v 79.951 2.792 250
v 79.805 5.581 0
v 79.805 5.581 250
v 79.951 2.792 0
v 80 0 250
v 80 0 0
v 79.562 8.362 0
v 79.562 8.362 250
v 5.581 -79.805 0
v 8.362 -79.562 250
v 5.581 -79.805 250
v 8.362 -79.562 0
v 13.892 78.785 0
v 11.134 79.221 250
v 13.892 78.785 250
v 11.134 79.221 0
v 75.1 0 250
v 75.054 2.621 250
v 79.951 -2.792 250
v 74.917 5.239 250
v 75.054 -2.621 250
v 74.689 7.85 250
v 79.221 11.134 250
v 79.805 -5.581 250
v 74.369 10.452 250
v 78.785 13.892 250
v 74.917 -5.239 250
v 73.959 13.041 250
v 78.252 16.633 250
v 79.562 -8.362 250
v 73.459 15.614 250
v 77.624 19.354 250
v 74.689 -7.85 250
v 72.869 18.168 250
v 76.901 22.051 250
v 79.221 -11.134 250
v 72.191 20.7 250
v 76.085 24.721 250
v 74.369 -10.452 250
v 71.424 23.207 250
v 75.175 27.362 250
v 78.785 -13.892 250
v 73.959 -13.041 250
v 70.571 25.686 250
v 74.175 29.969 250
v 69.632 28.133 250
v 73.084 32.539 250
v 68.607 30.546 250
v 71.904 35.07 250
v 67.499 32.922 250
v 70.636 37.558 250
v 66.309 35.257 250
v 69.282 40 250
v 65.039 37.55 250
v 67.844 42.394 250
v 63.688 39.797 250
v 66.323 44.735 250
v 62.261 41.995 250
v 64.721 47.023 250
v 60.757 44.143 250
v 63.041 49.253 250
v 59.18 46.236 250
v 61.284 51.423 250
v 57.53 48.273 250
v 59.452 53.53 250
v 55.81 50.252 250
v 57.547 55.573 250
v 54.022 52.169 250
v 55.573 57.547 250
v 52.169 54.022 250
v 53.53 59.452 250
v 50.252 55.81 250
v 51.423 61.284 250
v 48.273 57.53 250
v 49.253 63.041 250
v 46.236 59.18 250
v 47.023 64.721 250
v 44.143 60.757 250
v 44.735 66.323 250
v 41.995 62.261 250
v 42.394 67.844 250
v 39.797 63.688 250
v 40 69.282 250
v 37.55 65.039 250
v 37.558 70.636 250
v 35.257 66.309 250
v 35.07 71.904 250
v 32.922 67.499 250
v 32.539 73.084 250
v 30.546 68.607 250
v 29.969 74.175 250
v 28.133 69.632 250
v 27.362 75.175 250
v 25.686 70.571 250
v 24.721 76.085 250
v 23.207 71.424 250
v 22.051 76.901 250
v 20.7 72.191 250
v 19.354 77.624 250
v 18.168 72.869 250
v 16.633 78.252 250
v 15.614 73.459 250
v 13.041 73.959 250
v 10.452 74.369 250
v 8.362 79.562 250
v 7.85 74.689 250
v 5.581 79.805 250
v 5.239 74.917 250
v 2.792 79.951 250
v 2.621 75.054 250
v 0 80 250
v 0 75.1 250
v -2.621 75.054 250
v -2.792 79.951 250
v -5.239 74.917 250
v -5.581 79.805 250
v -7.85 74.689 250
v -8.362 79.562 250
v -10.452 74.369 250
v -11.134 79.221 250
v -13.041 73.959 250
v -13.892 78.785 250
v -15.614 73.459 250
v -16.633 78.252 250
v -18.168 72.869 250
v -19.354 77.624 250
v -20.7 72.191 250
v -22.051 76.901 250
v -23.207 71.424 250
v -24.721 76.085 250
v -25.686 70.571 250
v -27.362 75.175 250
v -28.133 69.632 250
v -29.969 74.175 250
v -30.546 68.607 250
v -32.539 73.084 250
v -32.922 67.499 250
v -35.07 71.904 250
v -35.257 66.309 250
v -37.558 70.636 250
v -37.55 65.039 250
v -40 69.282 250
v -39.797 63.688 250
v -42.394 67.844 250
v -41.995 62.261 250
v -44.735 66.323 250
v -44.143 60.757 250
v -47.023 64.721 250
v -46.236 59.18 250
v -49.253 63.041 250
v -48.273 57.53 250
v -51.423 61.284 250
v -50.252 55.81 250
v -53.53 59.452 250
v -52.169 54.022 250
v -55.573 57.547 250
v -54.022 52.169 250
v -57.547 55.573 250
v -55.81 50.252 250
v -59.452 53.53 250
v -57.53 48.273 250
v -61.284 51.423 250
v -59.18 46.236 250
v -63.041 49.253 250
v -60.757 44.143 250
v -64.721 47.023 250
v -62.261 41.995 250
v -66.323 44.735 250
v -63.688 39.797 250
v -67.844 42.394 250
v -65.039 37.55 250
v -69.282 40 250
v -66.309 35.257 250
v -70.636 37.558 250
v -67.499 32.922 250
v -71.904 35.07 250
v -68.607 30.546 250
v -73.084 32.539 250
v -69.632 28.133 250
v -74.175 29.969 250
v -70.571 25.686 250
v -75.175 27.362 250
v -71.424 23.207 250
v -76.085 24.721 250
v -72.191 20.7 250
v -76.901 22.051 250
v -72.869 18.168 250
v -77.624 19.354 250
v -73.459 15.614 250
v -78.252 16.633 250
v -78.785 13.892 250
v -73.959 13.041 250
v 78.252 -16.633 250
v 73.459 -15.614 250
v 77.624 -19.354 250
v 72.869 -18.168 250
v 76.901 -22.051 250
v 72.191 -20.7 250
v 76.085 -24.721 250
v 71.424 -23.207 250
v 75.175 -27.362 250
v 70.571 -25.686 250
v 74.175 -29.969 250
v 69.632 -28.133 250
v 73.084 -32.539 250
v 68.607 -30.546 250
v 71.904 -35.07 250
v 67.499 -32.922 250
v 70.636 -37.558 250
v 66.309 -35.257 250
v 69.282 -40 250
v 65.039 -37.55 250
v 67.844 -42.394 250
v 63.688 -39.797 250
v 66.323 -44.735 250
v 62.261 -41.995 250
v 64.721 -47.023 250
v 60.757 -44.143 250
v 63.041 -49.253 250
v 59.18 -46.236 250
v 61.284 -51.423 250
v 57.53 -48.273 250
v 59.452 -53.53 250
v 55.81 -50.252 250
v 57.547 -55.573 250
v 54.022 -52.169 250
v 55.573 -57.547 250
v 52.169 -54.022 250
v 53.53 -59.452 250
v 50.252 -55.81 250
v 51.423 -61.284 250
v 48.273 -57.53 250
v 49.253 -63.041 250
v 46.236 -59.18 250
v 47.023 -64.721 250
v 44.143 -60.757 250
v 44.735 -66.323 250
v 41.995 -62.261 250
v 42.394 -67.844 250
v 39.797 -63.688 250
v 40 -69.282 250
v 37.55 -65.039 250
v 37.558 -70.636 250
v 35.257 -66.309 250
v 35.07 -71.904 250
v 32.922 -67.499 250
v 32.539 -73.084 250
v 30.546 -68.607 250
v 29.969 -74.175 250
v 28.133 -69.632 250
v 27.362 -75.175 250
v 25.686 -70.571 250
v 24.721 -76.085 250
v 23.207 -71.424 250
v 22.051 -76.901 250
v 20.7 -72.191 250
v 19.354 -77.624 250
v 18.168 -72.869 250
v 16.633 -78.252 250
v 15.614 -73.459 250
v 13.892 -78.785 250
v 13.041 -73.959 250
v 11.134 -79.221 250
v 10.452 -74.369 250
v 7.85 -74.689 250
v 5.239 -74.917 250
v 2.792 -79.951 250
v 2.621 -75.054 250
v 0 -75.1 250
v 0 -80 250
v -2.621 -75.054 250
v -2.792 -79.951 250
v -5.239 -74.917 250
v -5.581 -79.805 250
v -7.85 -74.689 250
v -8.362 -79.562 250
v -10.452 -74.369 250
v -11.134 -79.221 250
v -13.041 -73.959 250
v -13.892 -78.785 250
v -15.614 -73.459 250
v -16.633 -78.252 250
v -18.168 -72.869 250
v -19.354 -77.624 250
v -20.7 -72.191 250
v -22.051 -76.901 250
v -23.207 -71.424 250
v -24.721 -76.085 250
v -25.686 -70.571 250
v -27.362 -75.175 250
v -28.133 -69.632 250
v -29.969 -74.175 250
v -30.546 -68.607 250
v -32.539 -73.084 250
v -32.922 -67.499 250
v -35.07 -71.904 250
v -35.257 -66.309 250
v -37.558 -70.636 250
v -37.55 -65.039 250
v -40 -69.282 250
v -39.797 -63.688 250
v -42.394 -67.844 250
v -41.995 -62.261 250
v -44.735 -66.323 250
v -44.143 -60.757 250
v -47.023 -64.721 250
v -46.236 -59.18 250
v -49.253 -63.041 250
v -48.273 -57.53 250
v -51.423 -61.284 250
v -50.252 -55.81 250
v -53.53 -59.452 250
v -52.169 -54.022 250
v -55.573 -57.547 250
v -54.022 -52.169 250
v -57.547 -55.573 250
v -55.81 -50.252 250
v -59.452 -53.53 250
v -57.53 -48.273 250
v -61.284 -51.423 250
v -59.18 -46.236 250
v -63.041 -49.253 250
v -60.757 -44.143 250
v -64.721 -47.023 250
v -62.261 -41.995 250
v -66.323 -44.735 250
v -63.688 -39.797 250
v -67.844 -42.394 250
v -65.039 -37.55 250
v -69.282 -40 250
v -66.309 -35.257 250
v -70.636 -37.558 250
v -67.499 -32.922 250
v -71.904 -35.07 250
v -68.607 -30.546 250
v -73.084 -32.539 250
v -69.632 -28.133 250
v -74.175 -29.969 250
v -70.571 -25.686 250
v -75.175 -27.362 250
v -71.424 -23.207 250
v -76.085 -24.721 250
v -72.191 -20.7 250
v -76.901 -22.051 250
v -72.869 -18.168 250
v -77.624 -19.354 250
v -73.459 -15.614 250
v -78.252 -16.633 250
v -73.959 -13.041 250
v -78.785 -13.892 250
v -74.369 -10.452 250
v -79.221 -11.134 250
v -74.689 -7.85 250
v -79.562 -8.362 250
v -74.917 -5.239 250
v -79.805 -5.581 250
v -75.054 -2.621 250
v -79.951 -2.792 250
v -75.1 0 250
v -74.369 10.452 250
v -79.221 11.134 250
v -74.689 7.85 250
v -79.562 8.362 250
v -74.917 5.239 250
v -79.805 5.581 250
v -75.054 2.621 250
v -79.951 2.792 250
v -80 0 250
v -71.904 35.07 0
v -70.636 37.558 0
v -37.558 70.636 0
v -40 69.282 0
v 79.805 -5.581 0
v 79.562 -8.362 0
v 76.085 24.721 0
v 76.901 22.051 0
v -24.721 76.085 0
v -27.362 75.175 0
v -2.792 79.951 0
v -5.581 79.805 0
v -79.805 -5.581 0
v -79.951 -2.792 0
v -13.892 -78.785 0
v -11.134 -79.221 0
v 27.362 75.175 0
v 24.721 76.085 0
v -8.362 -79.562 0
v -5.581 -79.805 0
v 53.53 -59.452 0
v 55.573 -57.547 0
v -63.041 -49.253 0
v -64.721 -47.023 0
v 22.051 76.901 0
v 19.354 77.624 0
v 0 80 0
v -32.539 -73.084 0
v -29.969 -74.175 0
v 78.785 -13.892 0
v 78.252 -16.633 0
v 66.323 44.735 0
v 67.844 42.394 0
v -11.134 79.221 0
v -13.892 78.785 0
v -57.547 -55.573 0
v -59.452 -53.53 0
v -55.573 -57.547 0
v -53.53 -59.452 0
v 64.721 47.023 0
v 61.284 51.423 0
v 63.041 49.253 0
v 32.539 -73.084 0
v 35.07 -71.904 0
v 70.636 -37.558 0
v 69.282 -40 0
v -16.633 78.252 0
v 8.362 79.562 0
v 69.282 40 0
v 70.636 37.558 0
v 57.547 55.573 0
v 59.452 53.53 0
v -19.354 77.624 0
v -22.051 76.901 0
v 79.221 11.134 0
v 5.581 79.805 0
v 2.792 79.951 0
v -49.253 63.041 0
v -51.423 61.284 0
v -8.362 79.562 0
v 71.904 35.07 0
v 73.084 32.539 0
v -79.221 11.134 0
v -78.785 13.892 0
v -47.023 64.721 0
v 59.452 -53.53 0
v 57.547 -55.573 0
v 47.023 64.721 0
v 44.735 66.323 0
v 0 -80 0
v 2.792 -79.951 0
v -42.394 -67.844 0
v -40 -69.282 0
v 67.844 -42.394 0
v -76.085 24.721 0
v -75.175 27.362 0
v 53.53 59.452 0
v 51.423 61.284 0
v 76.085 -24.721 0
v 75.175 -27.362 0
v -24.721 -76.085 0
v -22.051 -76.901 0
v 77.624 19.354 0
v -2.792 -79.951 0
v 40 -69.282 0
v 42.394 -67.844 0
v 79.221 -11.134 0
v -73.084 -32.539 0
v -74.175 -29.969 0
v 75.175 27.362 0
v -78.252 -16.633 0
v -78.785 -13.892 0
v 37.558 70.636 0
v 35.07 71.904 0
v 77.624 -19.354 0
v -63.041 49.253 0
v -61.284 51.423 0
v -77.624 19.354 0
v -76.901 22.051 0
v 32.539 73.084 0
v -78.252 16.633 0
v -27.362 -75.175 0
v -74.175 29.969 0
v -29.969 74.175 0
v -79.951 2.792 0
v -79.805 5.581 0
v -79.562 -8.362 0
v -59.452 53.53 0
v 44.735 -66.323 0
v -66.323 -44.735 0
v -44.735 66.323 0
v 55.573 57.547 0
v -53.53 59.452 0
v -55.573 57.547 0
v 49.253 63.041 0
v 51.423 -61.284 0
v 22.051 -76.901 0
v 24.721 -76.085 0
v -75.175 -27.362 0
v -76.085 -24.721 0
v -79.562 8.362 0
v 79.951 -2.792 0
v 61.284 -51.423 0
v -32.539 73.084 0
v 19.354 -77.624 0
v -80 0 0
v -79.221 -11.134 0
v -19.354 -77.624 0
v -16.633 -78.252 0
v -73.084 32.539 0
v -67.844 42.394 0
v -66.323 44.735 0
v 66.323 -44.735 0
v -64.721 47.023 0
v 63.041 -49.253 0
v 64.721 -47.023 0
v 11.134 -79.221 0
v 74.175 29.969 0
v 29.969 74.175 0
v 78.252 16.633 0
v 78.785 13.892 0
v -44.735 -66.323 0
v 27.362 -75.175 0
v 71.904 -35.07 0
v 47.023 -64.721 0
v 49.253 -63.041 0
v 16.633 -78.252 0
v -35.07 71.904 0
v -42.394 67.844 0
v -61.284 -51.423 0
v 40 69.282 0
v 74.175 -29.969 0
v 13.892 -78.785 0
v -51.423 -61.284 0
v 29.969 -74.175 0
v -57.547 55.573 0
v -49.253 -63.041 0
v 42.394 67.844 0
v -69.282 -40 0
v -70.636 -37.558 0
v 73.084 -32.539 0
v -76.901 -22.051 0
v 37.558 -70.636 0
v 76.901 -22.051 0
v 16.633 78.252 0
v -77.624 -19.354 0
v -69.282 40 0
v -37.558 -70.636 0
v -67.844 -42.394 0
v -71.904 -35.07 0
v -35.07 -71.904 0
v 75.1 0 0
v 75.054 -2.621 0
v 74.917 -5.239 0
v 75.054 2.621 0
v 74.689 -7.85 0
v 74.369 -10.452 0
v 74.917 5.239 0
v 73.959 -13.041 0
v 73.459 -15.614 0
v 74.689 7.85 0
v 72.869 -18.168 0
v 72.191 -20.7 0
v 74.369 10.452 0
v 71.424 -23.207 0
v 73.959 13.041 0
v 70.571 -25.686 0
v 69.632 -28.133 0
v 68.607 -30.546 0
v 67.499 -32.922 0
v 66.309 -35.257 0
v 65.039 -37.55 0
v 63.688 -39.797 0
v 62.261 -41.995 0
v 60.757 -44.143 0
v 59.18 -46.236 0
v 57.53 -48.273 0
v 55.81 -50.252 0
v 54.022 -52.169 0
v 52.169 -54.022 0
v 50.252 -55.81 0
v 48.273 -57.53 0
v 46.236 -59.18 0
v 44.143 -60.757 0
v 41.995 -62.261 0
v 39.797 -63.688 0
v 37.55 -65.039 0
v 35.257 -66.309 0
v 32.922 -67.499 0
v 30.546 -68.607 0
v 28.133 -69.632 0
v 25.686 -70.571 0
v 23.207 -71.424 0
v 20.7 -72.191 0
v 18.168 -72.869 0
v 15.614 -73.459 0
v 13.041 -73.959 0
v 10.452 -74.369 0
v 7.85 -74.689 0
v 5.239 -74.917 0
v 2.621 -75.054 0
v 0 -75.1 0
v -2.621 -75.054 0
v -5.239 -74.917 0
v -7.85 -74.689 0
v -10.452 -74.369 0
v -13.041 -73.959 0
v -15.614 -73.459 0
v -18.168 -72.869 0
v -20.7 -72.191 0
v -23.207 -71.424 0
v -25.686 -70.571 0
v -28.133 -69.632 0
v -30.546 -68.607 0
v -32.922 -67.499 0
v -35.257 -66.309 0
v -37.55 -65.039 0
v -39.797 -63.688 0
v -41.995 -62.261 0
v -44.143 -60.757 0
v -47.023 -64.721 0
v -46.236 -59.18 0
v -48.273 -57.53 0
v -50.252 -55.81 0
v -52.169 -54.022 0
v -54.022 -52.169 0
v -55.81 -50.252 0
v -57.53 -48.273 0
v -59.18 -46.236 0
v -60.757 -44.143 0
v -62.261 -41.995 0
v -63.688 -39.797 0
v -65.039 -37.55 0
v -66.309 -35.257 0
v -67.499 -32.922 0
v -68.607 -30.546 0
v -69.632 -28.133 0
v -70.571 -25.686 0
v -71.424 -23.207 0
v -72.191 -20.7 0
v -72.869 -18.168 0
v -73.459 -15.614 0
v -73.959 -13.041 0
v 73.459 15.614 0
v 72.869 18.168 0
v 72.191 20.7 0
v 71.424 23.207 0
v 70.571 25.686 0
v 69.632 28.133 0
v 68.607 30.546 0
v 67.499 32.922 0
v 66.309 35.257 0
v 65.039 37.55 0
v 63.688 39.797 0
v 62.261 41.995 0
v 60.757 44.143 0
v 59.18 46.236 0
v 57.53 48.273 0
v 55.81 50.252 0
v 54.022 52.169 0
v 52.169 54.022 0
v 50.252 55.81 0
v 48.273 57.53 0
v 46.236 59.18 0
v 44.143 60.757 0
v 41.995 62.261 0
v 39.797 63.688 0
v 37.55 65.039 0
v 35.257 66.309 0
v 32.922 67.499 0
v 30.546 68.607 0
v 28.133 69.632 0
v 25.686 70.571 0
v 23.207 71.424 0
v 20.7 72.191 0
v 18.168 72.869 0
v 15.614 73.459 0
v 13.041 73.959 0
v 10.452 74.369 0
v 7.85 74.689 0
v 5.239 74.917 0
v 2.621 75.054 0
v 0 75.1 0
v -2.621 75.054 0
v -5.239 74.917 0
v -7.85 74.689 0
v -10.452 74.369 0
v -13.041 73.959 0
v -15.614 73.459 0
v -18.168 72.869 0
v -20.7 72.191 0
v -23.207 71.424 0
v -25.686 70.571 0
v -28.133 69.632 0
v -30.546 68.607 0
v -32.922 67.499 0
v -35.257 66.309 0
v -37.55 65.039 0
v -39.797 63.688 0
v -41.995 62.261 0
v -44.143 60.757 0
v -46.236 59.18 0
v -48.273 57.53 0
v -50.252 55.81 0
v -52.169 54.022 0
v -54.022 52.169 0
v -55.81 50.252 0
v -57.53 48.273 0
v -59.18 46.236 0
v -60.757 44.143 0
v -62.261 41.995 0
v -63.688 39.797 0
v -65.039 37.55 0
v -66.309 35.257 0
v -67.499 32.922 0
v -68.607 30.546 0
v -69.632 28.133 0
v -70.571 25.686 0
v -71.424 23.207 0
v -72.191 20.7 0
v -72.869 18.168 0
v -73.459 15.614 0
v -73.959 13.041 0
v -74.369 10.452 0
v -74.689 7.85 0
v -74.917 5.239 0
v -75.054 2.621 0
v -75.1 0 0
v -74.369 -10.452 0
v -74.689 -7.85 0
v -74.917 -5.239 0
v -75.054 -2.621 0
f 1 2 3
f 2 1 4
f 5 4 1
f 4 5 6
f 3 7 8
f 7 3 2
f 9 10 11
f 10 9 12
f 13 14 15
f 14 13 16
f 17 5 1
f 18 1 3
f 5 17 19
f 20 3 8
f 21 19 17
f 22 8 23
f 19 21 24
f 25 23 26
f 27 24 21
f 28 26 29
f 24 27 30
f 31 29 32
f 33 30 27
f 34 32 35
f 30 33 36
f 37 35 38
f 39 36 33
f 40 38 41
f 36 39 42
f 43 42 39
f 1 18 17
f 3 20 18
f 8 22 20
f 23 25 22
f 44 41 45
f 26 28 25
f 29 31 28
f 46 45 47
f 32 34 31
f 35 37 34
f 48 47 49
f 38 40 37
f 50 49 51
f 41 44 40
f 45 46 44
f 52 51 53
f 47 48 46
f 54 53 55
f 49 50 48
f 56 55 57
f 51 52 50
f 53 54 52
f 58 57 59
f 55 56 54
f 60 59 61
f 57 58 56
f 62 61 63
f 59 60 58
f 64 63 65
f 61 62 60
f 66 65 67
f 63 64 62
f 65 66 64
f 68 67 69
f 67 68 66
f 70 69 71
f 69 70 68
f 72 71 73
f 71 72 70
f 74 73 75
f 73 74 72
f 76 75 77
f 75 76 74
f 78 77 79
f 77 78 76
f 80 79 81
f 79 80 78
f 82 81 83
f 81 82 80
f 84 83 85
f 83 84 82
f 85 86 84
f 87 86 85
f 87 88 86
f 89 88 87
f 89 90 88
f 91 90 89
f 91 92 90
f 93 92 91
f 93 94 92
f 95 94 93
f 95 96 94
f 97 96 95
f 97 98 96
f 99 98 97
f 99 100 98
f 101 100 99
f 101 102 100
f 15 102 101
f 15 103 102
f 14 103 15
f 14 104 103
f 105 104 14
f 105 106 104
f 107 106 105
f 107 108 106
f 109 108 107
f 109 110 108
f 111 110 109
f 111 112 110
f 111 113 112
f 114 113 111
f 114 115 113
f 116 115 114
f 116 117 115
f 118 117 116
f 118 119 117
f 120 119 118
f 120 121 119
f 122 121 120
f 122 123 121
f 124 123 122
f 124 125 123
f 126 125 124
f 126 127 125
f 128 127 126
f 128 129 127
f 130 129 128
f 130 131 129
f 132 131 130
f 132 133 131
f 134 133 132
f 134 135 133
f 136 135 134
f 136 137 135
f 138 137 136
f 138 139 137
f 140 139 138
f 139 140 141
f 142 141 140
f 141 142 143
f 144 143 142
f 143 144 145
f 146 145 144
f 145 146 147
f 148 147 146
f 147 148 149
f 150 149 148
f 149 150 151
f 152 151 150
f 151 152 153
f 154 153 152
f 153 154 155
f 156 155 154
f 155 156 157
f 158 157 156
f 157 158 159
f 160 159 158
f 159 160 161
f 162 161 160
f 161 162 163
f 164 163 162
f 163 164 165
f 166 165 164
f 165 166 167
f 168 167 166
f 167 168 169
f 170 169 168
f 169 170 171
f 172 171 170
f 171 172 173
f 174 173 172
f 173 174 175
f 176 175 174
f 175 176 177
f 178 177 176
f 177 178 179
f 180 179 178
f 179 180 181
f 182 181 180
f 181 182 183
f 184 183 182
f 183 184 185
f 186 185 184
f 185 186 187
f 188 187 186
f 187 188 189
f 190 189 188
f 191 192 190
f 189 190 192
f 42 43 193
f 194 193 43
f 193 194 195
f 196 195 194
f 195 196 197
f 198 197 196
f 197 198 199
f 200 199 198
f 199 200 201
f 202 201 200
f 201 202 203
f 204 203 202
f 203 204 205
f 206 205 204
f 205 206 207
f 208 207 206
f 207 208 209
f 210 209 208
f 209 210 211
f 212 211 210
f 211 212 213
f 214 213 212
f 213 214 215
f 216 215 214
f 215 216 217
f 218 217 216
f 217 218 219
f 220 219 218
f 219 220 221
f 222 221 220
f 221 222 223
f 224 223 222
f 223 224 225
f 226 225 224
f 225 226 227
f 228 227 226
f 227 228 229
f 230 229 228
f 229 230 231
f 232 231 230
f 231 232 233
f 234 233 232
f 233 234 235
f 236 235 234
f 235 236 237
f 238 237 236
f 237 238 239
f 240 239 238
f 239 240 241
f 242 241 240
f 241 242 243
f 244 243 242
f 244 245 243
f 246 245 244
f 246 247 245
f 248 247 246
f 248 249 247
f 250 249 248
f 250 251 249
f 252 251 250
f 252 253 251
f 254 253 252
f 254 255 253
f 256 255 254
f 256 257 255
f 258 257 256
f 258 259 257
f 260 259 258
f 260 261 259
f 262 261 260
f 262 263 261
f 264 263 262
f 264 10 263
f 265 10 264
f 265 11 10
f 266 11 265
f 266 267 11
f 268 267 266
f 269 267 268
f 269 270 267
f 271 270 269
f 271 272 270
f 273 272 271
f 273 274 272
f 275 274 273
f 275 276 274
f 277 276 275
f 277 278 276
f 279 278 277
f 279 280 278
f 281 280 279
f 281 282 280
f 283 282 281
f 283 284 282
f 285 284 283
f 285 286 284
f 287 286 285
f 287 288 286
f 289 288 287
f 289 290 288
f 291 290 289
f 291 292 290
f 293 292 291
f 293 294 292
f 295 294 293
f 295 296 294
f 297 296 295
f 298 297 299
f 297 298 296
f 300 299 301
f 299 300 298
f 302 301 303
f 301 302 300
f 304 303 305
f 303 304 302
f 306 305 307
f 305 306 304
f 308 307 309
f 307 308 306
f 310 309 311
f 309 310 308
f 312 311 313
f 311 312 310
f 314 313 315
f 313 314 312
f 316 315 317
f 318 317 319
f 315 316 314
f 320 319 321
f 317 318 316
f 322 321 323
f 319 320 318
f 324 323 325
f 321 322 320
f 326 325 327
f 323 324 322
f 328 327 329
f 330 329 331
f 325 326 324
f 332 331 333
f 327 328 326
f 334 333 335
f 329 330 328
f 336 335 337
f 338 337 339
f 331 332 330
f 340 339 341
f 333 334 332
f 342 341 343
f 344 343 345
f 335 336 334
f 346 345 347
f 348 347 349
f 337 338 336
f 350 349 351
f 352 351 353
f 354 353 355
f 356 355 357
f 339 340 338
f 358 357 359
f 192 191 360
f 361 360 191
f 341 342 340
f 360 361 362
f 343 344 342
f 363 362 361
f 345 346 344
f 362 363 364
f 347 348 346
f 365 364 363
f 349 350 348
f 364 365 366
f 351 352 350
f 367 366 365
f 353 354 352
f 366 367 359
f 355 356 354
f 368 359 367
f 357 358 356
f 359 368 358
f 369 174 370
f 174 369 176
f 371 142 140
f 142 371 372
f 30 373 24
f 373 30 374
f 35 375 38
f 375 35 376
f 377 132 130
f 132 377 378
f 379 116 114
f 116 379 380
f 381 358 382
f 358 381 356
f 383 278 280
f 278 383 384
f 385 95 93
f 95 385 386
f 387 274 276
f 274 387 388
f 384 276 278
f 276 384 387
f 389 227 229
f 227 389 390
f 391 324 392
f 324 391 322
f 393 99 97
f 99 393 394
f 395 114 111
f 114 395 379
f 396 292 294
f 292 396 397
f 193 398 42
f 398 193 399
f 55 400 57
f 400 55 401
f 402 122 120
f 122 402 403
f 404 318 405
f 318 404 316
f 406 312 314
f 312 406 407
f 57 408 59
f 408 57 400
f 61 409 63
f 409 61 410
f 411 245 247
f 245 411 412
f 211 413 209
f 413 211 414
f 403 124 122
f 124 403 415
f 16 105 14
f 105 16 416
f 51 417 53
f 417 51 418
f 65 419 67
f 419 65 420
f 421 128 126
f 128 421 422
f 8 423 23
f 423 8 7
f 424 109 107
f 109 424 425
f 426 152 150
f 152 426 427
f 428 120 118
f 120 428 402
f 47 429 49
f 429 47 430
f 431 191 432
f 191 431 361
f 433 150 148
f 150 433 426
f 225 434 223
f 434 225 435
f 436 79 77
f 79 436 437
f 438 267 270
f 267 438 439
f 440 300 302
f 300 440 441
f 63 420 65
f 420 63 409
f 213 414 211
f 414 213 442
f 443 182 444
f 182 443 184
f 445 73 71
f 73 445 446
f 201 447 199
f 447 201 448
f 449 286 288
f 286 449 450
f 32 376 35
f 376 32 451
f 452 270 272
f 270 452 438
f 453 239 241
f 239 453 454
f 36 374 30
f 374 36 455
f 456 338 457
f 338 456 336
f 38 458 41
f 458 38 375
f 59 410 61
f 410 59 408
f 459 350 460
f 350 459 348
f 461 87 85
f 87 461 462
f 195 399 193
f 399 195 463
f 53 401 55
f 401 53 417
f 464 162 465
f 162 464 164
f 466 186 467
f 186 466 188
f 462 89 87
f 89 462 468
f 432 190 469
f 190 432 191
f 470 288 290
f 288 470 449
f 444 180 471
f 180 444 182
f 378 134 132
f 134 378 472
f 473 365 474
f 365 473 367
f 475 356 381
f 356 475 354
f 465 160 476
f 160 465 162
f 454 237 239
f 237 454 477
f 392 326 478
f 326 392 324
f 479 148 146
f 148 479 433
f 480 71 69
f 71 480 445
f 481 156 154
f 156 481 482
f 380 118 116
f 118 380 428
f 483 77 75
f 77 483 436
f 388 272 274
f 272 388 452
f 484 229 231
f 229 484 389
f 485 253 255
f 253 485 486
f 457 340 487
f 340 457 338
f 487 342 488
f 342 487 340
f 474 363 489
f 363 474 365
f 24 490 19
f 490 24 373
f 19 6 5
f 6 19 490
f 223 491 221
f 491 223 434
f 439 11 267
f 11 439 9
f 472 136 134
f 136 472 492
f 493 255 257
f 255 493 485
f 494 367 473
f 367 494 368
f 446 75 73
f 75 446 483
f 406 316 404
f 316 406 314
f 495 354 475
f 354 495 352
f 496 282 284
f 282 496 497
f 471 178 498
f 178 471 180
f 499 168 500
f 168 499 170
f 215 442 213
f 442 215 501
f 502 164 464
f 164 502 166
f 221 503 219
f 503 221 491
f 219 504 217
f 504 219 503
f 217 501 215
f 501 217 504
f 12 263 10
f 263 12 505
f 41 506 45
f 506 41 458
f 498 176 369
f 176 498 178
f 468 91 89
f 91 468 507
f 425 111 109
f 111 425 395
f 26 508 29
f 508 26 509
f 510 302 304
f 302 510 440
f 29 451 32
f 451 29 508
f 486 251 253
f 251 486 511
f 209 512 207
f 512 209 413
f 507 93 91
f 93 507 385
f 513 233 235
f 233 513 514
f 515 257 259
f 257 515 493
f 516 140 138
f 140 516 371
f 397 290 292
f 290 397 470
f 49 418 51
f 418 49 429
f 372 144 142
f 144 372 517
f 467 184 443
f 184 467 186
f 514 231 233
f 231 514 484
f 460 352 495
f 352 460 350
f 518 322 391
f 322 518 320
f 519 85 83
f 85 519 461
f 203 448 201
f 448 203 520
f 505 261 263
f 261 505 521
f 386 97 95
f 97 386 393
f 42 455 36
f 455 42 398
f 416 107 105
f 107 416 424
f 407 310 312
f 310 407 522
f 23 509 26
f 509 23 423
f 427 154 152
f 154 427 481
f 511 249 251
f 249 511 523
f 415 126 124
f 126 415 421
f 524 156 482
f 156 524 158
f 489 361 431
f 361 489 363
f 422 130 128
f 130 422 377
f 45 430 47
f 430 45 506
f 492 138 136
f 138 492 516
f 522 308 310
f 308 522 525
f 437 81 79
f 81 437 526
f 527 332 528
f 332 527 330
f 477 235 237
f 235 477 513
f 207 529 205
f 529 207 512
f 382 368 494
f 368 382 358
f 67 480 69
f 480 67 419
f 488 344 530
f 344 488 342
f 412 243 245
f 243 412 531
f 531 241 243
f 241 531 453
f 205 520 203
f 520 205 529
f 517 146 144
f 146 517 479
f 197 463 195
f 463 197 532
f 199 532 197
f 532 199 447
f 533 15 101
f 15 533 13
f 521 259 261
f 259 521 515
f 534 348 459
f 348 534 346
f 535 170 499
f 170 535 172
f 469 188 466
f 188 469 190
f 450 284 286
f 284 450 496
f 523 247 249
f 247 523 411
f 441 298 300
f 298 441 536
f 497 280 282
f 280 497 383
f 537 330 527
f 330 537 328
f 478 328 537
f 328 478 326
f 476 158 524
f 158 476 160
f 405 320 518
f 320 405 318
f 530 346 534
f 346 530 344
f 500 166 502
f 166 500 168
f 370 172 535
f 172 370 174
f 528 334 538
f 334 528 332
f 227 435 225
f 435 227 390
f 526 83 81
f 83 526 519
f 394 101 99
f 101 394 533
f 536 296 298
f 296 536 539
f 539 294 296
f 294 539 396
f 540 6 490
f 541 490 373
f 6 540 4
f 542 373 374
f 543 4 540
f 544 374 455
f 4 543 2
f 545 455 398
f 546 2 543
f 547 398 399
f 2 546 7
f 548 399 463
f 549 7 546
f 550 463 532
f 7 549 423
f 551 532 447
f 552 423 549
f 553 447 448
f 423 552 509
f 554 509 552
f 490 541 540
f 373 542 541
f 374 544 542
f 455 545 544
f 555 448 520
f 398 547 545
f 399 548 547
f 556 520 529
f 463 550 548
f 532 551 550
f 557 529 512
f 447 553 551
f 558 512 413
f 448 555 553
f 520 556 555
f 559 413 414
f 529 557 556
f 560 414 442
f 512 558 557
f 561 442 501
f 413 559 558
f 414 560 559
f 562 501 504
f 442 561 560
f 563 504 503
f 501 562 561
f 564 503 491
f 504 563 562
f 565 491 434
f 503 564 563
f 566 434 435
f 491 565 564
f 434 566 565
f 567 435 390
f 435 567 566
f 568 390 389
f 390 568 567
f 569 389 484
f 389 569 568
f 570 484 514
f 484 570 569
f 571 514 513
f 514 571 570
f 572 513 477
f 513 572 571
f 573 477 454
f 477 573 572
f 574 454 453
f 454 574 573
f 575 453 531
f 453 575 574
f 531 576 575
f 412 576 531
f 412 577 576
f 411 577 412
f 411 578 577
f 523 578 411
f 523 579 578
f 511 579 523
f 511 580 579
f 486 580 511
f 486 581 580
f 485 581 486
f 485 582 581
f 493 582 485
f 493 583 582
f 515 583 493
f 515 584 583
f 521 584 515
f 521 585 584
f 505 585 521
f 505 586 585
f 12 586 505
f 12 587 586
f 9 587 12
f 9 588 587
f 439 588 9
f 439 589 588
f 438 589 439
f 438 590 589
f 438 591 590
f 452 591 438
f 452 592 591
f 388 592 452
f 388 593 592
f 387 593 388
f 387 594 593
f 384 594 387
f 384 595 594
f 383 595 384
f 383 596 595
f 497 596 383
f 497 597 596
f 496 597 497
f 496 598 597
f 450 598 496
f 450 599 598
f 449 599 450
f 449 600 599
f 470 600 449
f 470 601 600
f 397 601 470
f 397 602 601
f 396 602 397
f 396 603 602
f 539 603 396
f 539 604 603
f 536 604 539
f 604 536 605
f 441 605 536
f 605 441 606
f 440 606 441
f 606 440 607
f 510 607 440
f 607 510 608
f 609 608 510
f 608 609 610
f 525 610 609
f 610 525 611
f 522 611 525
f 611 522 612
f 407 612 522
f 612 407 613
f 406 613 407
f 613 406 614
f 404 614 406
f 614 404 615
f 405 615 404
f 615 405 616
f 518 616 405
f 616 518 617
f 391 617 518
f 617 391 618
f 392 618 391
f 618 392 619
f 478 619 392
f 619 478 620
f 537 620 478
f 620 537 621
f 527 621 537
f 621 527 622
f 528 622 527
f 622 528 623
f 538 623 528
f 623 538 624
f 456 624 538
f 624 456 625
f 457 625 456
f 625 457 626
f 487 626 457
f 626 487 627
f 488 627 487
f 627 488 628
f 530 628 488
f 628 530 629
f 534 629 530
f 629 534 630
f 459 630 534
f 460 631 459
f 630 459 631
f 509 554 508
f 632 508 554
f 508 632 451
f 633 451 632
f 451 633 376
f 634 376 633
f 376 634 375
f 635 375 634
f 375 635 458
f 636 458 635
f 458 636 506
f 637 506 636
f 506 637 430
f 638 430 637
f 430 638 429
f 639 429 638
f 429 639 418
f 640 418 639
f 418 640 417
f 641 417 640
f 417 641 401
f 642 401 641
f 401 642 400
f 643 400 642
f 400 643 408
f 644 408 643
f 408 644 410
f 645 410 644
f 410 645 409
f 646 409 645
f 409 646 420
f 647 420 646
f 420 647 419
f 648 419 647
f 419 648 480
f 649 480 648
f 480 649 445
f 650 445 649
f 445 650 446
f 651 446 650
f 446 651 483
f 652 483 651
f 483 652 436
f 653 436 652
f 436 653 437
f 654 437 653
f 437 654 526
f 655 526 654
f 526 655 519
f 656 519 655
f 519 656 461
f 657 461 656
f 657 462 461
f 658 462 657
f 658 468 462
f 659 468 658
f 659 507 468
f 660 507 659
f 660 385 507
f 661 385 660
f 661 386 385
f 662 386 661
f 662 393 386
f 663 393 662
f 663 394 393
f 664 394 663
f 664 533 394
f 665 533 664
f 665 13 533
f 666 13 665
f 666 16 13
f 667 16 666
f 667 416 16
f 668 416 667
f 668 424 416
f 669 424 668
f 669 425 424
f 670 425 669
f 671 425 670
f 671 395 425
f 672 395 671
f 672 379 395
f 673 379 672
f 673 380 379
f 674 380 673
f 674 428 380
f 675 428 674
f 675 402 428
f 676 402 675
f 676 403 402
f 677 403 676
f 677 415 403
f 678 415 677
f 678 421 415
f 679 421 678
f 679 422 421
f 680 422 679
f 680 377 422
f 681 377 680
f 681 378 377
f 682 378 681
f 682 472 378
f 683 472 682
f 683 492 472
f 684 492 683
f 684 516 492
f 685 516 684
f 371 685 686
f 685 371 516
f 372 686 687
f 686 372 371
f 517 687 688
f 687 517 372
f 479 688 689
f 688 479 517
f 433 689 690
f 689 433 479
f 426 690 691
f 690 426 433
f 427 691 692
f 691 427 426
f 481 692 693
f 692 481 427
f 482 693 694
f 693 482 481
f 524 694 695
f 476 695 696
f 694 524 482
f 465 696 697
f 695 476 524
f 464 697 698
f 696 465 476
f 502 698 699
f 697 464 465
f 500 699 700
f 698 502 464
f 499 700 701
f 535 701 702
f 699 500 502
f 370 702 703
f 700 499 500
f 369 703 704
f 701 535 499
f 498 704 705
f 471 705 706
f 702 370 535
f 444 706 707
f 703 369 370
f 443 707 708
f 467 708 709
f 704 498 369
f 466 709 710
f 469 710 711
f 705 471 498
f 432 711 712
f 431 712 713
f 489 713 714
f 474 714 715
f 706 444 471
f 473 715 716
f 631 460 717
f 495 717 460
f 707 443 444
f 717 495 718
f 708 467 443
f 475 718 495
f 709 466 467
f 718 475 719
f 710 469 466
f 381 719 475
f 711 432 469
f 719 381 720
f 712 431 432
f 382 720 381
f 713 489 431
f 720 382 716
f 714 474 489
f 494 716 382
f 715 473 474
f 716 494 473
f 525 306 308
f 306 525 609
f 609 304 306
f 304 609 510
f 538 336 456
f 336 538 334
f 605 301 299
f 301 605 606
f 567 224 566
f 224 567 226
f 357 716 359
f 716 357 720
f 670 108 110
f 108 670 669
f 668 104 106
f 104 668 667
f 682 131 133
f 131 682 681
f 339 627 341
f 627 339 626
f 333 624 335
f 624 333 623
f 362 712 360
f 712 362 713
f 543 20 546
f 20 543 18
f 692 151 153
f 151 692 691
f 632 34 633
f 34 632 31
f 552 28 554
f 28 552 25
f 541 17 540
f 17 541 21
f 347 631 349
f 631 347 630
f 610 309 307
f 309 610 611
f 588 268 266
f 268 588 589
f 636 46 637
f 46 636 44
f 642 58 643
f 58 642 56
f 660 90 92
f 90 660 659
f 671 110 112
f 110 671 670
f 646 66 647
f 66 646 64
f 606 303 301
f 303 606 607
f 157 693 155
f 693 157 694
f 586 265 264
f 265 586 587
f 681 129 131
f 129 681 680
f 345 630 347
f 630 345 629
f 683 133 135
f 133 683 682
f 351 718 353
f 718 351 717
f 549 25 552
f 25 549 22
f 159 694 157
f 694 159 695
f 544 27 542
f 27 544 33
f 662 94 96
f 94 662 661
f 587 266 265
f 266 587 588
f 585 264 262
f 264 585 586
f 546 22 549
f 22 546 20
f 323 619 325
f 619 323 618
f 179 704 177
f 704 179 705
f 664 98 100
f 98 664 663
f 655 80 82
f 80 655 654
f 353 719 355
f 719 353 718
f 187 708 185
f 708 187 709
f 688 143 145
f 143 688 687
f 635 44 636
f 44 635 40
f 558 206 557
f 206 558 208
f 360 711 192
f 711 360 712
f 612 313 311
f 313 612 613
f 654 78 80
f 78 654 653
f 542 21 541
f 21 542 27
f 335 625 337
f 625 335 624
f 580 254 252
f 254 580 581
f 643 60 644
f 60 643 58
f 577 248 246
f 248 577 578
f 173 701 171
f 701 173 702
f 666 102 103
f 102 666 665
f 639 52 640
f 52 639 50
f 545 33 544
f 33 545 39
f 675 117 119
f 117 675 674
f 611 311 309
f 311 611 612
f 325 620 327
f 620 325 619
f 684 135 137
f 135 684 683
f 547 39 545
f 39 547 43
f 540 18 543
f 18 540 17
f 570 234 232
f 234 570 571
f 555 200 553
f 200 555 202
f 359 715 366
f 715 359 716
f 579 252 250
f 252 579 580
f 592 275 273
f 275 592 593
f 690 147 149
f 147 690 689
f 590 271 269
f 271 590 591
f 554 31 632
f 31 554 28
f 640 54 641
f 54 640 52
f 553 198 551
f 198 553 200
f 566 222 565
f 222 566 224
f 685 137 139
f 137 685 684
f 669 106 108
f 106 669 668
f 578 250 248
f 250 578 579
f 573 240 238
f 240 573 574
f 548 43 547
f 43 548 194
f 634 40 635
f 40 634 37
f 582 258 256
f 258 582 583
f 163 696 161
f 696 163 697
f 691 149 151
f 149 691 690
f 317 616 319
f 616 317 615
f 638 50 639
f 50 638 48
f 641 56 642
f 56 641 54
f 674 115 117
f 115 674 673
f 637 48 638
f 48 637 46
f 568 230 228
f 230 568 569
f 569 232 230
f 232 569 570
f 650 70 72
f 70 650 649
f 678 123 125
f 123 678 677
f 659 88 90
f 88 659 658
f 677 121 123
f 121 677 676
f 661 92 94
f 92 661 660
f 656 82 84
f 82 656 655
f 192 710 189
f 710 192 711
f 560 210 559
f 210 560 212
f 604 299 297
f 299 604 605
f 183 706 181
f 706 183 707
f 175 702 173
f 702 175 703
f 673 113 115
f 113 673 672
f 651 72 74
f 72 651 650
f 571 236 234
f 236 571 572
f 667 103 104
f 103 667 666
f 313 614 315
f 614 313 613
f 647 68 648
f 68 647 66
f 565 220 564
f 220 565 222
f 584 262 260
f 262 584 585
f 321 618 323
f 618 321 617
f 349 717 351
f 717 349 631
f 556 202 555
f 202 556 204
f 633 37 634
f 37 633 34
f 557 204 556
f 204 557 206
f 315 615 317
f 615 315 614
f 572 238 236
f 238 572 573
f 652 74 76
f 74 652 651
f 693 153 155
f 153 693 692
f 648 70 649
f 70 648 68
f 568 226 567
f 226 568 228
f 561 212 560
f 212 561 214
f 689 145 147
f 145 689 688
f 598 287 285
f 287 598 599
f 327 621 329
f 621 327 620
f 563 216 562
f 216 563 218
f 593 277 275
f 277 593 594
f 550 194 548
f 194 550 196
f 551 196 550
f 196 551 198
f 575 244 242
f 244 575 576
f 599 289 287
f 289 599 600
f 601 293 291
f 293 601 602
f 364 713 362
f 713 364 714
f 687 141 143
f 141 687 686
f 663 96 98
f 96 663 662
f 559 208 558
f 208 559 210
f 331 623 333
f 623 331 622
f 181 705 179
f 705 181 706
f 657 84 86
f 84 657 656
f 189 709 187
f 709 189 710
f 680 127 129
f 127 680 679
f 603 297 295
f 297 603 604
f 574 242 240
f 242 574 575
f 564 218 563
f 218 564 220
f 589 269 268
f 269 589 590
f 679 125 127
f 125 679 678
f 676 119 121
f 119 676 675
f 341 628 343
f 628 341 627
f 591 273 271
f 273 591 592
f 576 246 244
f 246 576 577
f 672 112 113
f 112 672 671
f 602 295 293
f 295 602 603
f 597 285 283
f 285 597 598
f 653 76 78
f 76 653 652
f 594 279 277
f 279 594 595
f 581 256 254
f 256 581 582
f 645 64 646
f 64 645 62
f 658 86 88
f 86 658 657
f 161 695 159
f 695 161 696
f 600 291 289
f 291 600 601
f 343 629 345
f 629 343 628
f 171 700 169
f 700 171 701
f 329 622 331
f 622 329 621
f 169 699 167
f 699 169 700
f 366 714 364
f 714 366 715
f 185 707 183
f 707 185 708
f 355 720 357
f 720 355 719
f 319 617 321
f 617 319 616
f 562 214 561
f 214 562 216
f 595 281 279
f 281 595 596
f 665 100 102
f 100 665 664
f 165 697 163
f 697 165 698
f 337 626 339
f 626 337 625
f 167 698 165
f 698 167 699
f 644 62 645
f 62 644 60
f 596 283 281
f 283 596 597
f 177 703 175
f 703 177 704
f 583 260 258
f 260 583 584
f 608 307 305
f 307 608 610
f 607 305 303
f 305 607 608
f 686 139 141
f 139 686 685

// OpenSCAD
$fn = 180;

// HT pipe parameters (approximation)
od = 160;          // outer diameter in mm
length = 250;      // pipe length in mm
wall = 4.9;        // typical HT 160 wall thickness (approx.)
id = od - 2*wall;  // inner diameter

module ht_pipe(od, id, length) {
    difference() {
        cylinder(h = length, d = od);
        translate([0,0,-0.5])
            cylinder(h = length + 1, d = id);
    }
}

ht_pipe(od, id, length);
